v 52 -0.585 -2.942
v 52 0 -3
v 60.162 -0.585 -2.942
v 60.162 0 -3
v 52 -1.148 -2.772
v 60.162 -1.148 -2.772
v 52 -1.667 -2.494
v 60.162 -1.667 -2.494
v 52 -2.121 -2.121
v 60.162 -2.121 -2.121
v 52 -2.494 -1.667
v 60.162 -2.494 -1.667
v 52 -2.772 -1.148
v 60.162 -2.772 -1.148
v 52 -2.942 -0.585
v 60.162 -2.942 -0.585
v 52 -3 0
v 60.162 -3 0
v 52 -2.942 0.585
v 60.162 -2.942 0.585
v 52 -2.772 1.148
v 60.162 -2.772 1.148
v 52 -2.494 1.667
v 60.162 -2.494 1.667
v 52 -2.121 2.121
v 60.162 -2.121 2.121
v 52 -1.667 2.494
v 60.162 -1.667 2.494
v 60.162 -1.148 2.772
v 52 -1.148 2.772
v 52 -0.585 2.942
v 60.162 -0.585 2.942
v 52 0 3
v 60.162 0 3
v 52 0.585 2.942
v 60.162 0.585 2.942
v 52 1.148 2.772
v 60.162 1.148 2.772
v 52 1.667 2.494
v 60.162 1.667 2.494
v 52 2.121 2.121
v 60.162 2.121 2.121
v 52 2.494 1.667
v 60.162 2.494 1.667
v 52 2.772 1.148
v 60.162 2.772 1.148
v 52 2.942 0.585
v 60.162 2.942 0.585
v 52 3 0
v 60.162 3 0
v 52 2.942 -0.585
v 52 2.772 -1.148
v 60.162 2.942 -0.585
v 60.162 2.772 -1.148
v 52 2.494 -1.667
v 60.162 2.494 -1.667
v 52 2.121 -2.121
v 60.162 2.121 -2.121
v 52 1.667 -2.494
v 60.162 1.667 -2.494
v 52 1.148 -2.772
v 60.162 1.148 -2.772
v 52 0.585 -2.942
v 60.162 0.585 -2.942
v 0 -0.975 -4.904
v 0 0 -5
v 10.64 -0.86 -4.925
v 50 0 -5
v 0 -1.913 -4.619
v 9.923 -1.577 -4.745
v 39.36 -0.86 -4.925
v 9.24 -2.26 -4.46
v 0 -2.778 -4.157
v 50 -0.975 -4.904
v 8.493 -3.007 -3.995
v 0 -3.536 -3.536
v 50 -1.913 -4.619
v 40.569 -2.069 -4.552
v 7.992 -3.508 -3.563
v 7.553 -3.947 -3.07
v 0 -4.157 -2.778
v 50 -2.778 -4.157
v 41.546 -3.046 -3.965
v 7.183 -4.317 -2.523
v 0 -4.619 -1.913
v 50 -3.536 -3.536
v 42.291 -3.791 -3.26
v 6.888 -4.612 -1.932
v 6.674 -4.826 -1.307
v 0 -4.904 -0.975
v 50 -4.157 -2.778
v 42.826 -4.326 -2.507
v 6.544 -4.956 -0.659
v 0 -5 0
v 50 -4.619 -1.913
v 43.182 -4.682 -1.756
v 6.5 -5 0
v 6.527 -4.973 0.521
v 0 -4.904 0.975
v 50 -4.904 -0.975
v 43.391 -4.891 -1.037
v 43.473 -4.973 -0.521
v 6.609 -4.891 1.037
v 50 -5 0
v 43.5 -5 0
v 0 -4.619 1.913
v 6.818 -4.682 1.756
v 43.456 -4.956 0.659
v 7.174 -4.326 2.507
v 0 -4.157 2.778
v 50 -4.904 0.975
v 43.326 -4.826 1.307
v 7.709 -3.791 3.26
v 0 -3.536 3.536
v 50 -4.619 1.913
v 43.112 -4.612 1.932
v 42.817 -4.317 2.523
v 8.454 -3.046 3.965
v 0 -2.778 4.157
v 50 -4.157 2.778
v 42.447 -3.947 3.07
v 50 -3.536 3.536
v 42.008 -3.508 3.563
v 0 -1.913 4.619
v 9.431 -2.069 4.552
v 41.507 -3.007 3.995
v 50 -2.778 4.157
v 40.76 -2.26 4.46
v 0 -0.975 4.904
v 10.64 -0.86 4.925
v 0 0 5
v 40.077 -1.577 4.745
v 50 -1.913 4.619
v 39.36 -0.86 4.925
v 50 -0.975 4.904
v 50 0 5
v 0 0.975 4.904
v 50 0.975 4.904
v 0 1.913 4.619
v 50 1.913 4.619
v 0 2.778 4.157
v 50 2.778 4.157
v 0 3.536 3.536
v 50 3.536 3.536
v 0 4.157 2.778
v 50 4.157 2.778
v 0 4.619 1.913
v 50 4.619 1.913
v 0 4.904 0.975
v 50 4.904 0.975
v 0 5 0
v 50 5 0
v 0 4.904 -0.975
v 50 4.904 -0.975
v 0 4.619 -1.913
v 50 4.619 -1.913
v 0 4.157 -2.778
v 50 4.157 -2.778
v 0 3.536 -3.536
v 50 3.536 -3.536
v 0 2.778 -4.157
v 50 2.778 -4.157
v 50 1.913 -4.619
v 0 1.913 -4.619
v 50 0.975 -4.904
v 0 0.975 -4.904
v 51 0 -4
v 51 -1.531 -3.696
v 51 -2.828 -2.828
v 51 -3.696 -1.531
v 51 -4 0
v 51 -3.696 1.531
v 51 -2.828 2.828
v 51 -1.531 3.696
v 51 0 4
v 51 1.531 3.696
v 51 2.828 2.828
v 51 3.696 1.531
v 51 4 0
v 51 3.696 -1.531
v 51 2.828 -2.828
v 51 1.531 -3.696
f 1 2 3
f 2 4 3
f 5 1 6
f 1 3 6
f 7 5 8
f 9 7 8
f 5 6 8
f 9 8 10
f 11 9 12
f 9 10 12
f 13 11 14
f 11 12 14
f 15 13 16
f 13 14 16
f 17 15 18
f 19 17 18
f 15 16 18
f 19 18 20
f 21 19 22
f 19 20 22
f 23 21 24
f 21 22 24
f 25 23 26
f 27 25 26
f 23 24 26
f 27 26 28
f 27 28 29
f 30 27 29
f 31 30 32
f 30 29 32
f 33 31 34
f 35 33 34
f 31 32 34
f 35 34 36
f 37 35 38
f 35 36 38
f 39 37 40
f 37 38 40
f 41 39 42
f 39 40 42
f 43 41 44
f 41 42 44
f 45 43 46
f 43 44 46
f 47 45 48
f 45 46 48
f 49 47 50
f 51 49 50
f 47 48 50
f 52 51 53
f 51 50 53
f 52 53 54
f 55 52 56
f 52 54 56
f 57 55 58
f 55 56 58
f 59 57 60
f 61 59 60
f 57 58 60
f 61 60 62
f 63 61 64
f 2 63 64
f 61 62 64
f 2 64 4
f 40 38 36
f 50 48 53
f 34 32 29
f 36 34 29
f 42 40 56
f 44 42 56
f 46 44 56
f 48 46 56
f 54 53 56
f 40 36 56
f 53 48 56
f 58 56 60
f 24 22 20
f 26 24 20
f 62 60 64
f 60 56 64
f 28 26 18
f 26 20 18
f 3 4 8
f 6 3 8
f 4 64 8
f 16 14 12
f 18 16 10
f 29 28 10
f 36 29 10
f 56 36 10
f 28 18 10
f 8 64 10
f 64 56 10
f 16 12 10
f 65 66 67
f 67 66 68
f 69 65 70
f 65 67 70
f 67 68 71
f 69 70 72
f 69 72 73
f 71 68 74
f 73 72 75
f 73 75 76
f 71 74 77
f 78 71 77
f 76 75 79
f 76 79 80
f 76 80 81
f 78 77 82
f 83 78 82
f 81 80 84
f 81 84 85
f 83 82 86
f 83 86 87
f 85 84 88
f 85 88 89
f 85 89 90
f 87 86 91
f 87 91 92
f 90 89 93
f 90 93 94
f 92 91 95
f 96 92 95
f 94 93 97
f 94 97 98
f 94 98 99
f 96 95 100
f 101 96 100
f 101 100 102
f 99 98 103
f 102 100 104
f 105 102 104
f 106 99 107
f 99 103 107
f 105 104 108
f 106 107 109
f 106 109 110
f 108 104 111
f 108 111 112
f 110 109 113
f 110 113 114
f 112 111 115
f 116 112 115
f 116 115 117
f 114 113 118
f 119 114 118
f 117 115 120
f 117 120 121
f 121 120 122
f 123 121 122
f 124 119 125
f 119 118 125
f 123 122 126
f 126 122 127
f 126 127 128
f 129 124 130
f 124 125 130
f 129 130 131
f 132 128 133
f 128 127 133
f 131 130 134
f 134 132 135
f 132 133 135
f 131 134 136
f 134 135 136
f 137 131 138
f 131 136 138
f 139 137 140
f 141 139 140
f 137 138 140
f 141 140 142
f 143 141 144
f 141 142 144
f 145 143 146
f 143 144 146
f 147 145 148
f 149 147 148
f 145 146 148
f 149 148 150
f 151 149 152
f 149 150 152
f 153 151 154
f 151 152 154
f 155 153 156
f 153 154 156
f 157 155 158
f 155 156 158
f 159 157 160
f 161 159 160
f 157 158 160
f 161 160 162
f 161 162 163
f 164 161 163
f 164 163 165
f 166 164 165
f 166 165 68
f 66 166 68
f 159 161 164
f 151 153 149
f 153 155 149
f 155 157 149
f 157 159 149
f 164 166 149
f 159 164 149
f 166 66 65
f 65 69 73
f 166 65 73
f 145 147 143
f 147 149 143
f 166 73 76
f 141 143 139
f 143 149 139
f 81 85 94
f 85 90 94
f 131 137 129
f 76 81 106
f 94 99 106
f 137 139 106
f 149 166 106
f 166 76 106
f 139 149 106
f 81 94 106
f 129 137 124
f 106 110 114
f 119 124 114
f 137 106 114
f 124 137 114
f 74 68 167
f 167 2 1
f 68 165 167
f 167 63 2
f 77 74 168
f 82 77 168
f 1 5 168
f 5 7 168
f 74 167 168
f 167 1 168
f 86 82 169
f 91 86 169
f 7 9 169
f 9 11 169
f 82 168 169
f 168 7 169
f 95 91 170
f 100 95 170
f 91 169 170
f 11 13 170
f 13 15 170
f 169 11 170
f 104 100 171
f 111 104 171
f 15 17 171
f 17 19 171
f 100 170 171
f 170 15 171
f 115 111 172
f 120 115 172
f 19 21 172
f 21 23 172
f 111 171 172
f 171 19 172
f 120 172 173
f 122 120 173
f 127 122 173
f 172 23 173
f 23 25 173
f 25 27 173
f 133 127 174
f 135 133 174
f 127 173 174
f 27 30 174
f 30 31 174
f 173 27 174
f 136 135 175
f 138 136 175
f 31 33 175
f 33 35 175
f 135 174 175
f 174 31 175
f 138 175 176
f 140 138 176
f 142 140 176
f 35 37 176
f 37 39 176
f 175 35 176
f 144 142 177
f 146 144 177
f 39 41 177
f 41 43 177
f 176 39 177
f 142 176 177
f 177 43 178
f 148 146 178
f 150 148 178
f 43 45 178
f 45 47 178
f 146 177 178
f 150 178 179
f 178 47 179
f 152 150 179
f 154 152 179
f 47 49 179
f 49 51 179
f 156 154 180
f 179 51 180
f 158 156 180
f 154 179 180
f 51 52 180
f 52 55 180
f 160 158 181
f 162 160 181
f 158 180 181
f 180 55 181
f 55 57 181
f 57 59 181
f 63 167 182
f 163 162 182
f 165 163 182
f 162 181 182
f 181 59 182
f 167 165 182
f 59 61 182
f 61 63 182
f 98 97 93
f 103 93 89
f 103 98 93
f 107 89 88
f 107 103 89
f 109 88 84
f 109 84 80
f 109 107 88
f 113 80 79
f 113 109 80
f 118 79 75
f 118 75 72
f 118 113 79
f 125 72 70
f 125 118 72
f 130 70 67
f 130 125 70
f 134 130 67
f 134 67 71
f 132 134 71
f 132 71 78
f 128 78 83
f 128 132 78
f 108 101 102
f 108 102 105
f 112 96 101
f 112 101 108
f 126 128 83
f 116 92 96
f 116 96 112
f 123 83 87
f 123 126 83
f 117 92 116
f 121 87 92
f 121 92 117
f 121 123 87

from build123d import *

# Parameters (mm, degrees)
CUT_EXTRUDE1_DEPTH = 17.5


with BuildPart() as part:
    # Sketch1 → Revolve1 (revolve)
    with BuildSketch(Plane.XY, mode=Mode.PRIVATE) as revolve1_sk:
        Polygon((0, 0), (0, 5), (50, 5), (52, 3), (60.162162162, 3), (60.162162162, 0), align=None)
    revolve(revolve1_sk.sketch.rotate(Axis((60.162162162, 0, 0), (-1, 0, 0)), 90), axis=Axis((60.162162162, 0, 0), (-1, 0, 0)))

    # Sketch2 → Cut-Extrude1 (cut, symmetric)
    with BuildSketch(Plane.XY):
        Polygon((6.5, -5), (10.64, -0.86), (39.36, -0.86), (43.5, -5), align=None)
    extrude(amount=CUT_EXTRUDE1_DEPTH, both=True, mode=Mode.SUBTRACT)


solid = part.part
